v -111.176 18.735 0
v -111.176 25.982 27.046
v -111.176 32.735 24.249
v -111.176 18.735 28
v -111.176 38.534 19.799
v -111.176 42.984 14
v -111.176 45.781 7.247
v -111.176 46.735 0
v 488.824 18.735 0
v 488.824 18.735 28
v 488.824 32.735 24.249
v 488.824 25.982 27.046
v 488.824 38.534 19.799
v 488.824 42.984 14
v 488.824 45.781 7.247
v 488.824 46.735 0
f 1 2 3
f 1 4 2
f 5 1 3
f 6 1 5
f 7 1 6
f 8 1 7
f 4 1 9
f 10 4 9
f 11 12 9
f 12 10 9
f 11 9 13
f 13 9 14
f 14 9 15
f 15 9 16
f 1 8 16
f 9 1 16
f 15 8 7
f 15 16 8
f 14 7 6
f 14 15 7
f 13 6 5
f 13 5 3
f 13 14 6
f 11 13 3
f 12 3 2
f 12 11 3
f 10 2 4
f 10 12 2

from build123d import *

# Parameters (mm, degrees)
ESQUISSE1_W        = 600
ESQUISSE1_H        = 28
BOSS_EXTRU_1_DEPTH = 28
CONG_1_R           = 28


with BuildPart() as part:
    # Esquisse1 → Boss.-Extru.1 (new body)
    with BuildSketch(Plane.XY):
        with Locations((188.823529412, 32.735294118)):
            Rectangle(ESQUISSE1_W, ESQUISSE1_H)
    extrude(amount=BOSS_EXTRU_1_DEPTH)

    # Congé1
    cong_1_edges = [part.edges().sort_by_distance(p)[0] for p in [
        (188.823529412, 46.735294118, 28),
    ]]
    fillet(cong_1_edges, radius=CONG_1_R - 0.0001)  # a hair under: the kernel refuses the full size


solid = part.part
